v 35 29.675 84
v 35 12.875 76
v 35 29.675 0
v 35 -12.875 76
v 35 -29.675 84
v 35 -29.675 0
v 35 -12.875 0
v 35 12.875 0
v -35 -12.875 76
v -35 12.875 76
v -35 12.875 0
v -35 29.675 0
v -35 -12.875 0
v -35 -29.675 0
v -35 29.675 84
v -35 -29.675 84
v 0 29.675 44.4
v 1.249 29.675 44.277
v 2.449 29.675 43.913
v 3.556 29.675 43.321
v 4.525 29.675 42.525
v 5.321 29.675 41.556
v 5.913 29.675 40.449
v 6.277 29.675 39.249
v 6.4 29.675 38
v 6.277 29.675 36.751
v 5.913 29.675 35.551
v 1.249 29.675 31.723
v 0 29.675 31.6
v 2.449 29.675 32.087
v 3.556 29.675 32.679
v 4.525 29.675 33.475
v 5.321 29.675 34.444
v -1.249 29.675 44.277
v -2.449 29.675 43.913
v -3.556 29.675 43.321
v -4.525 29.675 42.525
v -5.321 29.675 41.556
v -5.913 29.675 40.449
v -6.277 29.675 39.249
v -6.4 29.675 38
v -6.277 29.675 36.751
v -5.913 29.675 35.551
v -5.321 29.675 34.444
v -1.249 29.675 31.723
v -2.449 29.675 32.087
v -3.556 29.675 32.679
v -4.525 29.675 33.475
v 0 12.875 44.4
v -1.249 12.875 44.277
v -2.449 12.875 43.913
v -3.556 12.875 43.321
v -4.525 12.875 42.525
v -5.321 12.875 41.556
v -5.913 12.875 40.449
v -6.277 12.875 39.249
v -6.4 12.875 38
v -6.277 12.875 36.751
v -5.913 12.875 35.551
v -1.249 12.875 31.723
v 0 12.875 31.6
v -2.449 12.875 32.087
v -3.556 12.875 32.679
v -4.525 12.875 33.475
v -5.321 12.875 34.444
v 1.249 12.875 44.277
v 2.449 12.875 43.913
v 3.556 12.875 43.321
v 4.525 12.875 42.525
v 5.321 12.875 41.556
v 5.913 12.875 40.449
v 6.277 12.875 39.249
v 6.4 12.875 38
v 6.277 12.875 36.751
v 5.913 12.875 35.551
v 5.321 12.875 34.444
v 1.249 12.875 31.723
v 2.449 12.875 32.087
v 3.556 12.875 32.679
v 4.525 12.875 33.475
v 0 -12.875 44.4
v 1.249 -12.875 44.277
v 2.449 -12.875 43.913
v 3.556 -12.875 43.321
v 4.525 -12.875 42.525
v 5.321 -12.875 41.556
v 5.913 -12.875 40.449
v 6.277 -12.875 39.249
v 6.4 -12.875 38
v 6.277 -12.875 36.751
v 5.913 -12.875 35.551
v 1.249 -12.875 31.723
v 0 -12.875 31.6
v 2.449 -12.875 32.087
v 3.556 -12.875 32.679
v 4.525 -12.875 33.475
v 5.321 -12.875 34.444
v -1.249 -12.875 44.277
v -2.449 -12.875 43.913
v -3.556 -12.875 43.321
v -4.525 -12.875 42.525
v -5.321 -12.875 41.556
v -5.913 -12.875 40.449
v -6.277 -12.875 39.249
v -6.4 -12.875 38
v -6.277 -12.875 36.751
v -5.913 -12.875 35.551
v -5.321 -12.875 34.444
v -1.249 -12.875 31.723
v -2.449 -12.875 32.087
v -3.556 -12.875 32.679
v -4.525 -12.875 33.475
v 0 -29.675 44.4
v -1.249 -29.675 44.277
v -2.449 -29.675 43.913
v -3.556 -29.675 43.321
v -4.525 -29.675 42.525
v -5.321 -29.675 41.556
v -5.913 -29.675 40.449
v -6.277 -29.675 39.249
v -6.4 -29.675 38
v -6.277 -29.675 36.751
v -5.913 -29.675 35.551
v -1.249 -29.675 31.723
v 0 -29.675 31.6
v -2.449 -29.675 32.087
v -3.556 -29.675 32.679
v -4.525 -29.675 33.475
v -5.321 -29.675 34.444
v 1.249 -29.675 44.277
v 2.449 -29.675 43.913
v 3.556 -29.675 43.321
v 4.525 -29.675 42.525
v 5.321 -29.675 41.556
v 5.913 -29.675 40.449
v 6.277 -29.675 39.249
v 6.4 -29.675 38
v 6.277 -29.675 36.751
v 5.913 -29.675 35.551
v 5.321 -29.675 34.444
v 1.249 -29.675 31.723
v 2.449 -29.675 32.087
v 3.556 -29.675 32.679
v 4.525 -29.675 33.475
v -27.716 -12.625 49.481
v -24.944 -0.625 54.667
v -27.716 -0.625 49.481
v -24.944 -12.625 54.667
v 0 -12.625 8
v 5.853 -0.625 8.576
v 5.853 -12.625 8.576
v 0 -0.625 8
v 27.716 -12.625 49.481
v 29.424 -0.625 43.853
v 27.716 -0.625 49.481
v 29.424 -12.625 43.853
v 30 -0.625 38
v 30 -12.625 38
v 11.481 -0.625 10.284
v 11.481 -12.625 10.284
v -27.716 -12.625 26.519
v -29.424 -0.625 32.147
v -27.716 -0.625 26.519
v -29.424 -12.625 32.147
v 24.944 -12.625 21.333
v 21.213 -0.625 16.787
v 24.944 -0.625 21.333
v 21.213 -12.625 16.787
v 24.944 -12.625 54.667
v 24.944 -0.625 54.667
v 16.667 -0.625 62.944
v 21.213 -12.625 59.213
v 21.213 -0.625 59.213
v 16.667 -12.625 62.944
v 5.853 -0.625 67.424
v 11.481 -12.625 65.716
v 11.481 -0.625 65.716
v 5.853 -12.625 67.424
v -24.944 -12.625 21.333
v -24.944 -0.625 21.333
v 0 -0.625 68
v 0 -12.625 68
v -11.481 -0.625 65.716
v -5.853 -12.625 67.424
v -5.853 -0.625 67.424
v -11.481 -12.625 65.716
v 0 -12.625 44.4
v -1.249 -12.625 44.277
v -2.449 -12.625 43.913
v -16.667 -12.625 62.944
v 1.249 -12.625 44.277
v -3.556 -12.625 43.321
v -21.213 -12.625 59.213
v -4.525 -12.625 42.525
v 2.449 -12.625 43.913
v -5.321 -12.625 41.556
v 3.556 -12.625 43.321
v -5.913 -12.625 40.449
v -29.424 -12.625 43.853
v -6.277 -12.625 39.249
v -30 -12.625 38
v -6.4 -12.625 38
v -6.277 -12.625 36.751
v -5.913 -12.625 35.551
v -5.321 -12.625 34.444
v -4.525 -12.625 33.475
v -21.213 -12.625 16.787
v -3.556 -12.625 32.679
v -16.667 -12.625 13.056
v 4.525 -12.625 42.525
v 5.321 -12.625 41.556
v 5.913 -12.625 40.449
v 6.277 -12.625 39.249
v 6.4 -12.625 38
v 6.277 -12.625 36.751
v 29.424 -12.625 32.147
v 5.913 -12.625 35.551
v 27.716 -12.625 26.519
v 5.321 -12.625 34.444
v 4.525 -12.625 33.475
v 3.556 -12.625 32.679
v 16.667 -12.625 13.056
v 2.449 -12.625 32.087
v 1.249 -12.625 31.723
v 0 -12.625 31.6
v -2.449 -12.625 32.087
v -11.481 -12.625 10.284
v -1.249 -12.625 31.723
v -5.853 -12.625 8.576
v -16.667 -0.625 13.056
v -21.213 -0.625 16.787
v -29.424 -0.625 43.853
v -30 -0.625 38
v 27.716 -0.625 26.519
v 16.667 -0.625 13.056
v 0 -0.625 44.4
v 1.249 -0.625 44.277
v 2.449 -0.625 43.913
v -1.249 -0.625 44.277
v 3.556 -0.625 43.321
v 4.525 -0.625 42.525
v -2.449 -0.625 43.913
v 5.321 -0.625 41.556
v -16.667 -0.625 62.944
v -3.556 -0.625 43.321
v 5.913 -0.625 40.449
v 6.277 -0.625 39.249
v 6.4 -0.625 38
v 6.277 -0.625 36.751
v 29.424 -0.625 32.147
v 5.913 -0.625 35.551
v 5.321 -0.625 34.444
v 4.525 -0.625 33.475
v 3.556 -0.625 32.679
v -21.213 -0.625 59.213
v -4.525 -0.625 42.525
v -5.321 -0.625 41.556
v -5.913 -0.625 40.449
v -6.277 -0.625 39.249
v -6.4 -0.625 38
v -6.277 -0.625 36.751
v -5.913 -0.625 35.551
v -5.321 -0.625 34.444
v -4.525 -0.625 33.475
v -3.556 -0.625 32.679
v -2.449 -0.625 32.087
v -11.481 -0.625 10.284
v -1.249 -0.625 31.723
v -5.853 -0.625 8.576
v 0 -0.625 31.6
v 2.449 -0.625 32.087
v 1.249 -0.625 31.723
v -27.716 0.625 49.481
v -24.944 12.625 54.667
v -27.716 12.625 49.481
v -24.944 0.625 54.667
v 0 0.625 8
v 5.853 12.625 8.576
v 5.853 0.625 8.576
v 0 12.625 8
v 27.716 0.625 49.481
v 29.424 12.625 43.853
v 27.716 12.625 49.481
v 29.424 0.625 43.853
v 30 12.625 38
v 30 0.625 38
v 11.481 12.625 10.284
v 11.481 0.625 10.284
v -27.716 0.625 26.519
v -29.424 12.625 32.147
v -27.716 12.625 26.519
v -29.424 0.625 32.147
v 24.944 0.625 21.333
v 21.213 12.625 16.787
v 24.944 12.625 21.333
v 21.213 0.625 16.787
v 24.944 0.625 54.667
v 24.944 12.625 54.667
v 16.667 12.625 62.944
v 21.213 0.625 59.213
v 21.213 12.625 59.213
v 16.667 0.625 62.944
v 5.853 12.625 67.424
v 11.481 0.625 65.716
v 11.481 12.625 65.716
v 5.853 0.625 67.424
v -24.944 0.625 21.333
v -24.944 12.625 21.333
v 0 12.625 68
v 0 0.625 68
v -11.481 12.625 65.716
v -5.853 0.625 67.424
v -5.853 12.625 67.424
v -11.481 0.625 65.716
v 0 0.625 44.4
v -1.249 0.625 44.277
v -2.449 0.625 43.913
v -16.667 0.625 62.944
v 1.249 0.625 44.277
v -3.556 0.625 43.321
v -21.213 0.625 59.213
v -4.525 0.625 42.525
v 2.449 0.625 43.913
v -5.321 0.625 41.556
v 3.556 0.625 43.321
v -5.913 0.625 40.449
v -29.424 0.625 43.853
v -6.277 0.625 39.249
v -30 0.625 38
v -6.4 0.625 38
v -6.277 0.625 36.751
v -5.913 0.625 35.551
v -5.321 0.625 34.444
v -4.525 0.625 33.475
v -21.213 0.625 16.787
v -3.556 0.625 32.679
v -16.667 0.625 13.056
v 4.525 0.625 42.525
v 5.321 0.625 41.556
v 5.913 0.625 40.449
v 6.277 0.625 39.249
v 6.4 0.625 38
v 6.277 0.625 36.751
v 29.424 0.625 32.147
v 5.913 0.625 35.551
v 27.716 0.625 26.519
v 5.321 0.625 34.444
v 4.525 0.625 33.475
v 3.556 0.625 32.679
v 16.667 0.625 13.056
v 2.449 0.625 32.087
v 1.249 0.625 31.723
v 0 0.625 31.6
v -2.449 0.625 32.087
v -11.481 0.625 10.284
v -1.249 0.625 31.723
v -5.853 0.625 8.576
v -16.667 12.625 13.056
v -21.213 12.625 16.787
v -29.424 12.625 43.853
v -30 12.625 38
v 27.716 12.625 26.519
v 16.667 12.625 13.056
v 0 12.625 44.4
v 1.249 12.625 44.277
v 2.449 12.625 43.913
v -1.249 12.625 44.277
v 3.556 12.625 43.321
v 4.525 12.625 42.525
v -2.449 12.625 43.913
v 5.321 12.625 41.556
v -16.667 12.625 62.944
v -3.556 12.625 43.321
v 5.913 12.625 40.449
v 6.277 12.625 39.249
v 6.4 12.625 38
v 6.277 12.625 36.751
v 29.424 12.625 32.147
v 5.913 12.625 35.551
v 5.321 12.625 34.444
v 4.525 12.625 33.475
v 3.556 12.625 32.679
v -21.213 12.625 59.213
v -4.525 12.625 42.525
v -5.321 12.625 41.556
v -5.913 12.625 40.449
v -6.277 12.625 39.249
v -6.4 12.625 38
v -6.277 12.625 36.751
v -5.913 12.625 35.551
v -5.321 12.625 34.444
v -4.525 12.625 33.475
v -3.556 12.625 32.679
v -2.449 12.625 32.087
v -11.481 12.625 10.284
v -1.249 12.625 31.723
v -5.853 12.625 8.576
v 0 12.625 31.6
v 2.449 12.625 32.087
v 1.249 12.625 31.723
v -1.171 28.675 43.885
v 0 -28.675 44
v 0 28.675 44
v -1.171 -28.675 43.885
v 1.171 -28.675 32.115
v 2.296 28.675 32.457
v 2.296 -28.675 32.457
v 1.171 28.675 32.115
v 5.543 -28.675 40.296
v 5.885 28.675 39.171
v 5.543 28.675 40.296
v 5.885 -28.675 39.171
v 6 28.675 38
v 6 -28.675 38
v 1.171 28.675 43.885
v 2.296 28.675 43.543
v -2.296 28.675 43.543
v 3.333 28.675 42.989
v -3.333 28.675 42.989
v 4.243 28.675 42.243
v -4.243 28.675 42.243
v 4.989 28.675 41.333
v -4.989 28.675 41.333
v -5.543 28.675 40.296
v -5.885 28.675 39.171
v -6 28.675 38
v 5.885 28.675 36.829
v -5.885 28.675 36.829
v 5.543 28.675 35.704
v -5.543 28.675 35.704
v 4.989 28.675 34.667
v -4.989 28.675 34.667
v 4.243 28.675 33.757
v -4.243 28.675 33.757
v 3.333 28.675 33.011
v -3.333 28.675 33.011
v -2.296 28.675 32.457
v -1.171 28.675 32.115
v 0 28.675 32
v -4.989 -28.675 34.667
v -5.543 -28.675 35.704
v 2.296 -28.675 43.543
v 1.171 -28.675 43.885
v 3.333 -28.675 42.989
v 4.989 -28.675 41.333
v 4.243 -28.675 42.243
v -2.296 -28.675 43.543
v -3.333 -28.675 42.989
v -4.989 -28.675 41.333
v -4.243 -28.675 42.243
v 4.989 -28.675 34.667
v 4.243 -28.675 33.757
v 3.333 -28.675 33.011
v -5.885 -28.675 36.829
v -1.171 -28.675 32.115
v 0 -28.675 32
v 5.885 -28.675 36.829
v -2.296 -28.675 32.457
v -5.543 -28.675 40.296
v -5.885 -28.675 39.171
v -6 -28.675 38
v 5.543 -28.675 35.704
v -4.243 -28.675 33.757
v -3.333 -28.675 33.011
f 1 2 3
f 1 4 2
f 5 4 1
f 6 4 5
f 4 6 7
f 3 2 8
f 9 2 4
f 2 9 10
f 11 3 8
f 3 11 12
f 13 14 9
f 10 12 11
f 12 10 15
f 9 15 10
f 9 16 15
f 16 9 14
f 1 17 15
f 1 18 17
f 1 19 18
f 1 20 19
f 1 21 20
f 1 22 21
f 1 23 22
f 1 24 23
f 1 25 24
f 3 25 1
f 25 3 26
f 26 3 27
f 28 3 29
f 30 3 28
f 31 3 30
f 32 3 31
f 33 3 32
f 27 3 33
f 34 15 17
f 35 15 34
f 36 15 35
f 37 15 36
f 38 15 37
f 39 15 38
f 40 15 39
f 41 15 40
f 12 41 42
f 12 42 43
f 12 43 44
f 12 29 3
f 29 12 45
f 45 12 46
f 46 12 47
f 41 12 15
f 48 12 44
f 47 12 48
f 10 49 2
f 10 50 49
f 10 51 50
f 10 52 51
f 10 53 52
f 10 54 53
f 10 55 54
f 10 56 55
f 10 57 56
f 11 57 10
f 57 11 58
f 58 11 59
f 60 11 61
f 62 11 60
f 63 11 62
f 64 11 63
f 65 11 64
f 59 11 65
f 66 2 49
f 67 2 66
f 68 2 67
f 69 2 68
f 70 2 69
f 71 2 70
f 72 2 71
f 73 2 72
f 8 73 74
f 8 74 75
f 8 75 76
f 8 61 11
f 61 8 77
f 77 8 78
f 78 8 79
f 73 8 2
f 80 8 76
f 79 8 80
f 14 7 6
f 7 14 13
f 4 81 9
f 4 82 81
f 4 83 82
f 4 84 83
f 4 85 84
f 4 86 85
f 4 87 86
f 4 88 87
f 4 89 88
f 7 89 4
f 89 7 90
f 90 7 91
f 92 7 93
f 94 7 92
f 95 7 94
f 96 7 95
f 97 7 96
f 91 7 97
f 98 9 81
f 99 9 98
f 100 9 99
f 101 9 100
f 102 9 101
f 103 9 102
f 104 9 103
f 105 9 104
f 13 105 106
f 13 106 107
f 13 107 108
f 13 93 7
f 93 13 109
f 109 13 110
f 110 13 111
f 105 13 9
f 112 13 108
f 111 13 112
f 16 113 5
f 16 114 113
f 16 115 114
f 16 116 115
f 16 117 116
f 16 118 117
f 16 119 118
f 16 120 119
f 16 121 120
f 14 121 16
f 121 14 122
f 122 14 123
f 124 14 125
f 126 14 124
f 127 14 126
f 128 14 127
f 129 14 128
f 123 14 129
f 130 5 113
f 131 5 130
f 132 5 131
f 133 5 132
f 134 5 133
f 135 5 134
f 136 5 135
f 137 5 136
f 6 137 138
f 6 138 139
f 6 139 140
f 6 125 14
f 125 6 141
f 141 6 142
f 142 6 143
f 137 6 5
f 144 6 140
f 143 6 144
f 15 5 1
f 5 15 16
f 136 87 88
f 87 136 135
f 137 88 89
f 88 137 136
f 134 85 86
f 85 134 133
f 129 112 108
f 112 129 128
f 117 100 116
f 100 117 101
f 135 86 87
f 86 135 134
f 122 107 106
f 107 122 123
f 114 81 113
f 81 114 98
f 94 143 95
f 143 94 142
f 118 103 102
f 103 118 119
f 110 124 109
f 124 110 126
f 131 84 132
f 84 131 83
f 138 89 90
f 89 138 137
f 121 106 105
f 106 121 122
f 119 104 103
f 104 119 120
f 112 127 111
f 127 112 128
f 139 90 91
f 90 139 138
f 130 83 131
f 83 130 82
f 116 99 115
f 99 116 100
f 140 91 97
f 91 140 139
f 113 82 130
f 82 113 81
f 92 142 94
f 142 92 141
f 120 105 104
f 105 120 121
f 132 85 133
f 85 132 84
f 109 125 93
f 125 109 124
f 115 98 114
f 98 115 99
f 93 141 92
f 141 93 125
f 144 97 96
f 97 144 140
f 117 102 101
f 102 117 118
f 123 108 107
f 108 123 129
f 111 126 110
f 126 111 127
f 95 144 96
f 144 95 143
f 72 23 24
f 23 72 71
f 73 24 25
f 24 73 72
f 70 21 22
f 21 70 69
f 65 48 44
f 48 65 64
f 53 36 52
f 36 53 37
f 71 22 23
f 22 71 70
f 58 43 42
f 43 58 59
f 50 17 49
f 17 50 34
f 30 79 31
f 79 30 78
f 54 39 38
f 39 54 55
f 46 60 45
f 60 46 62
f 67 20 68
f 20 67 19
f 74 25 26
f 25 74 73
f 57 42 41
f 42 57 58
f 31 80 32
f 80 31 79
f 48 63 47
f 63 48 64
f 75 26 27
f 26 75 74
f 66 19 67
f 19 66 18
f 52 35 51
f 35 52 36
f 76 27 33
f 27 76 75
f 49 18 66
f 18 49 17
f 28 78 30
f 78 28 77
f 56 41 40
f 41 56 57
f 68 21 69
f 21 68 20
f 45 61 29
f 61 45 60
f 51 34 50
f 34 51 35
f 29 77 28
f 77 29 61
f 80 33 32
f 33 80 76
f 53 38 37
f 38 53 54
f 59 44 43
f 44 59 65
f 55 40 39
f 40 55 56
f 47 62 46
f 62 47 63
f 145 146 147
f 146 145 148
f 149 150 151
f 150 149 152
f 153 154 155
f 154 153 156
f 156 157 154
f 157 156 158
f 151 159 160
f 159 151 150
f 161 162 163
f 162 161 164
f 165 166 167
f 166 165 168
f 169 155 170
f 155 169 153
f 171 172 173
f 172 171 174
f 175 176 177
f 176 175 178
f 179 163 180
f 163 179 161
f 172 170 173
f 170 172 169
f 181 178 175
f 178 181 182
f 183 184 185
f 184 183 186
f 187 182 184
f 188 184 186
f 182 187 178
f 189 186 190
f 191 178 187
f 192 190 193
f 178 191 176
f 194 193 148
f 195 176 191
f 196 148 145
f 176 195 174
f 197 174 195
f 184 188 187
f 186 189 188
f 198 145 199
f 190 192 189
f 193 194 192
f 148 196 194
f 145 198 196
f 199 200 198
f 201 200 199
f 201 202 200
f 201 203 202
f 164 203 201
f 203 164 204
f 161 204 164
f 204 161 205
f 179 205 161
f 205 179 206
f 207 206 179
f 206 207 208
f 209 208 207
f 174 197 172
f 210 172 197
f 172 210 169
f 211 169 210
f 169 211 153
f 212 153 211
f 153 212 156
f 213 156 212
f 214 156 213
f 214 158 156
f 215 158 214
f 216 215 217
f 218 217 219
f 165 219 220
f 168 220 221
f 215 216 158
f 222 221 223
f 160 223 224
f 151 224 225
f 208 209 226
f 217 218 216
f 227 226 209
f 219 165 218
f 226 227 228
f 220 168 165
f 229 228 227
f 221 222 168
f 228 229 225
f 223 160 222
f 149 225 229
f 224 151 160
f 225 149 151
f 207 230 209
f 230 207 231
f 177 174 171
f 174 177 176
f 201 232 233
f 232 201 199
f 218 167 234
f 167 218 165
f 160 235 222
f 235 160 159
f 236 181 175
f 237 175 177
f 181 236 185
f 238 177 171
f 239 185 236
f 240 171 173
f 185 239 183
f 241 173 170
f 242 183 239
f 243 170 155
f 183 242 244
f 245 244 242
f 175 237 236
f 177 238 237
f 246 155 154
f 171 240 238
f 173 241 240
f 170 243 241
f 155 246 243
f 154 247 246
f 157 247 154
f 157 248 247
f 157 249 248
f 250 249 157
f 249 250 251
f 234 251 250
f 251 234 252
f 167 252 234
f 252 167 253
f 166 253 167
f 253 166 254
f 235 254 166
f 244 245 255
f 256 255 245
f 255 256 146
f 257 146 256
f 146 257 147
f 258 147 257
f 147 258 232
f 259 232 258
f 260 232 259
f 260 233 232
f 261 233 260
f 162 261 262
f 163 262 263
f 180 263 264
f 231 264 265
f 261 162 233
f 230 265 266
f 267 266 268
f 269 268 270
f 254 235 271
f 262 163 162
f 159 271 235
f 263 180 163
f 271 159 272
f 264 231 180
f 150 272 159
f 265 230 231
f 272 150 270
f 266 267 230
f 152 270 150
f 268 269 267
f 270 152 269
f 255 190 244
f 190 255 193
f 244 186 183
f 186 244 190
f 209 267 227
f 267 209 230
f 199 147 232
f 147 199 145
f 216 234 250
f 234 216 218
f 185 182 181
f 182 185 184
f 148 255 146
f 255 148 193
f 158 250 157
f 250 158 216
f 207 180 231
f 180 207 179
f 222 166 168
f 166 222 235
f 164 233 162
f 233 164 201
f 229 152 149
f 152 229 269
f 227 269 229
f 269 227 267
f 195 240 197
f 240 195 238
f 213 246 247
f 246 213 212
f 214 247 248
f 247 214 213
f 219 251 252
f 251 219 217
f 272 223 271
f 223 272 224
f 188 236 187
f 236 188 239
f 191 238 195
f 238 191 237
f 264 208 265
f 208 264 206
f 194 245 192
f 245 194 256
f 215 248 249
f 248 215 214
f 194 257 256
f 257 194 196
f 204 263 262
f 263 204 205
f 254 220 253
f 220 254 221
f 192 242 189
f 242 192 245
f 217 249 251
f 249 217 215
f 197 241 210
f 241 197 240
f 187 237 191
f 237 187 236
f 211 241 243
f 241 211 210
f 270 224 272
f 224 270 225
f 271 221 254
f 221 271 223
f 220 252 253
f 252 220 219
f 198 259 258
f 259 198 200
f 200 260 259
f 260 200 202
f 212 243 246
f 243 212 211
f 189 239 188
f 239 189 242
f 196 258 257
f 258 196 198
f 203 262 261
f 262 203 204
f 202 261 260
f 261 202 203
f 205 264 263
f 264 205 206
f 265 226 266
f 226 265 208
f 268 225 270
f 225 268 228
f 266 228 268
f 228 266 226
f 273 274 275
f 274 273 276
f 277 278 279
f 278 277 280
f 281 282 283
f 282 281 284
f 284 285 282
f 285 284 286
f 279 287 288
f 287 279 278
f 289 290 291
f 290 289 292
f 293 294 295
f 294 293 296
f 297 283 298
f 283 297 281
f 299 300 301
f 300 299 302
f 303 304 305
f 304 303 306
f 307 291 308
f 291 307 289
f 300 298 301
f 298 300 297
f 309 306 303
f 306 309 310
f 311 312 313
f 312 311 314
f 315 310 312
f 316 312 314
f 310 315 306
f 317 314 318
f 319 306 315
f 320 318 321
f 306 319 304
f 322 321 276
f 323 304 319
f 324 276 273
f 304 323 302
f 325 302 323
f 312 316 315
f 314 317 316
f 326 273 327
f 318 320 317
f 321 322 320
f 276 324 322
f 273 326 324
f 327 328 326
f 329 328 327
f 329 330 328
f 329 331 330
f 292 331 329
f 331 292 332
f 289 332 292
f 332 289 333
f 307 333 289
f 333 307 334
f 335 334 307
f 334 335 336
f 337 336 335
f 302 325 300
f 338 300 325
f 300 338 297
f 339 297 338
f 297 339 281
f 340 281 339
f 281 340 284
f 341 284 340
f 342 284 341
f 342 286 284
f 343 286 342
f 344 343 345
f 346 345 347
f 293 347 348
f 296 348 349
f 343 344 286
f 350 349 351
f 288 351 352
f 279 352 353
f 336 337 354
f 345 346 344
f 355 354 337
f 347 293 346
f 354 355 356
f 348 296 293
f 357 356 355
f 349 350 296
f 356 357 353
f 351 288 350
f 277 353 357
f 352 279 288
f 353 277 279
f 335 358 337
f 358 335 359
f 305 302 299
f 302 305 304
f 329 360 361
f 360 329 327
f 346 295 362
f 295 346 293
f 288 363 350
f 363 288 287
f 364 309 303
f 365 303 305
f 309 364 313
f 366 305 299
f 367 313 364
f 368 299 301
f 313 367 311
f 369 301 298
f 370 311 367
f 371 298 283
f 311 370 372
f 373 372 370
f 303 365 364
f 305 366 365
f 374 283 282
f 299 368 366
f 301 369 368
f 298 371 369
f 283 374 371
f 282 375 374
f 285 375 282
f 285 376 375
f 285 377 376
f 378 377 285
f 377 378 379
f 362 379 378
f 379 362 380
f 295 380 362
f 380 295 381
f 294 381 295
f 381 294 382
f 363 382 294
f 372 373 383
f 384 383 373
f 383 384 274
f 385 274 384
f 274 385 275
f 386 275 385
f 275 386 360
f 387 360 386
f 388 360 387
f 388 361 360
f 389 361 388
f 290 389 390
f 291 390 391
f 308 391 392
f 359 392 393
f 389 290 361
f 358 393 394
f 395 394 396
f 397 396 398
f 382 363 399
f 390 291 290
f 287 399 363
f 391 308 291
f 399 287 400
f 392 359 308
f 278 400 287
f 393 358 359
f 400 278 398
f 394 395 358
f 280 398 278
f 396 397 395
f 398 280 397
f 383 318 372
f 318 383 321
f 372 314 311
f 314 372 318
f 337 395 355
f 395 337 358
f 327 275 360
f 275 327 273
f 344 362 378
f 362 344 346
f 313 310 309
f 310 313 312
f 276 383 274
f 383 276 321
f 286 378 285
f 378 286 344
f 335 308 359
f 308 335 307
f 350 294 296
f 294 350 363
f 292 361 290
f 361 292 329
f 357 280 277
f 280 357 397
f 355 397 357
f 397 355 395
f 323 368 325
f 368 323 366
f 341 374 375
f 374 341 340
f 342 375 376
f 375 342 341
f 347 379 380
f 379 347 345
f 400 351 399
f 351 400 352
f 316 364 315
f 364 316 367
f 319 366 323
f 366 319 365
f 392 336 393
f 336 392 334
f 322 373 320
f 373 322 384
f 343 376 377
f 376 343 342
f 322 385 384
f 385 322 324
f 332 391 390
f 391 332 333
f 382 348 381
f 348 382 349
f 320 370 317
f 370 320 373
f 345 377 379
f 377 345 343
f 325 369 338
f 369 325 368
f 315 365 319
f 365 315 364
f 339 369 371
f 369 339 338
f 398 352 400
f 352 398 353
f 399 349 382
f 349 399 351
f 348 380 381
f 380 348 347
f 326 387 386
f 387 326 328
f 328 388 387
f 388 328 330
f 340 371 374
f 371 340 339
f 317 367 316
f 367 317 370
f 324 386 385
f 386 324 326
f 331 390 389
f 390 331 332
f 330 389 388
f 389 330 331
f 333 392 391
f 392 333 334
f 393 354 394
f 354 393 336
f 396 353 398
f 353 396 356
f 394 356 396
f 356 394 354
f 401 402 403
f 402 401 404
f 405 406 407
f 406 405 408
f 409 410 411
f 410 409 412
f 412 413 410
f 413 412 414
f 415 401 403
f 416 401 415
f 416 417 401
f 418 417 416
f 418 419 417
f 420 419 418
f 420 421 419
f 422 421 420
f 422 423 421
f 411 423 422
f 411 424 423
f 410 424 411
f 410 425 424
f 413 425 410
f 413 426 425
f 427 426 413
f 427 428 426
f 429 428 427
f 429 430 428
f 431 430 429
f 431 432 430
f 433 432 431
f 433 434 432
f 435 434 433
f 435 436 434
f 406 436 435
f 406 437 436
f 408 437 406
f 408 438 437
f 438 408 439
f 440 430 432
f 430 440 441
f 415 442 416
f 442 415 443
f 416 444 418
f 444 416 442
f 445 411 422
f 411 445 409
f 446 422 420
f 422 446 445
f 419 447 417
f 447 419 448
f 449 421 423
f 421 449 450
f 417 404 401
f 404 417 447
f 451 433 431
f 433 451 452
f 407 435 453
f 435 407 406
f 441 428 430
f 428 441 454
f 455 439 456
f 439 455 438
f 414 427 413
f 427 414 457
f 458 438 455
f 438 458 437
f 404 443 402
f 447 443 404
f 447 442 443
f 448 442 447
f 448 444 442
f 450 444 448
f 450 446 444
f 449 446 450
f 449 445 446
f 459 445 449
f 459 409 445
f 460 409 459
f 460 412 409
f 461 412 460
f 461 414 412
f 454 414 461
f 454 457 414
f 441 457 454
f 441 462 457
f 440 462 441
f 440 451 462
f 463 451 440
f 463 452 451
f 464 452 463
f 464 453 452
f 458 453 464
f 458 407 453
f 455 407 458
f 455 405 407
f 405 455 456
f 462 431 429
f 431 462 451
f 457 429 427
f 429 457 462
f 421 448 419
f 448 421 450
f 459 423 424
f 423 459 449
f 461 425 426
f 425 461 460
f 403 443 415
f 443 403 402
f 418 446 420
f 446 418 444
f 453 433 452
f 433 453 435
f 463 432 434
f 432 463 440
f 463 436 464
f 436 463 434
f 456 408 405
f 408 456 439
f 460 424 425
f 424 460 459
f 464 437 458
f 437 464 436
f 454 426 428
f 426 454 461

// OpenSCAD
$fn = 32;

// ------------------------------------------------------------------------
// Trolley wheel set: wheels d60, fork 76 mm tall
// Every part is its own module, assembly() places every instance.
// ------------------------------------------------------------------------

// --- part 1 ---
module trolley_fork() {
  difference() {
    union() {
      translate([-35, 12.875, 0]) cube([70, 16.8, 76]);
      translate([-35, -29.675, 0]) cube([70, 16.8, 76]);
      translate([-35, -29.675, 76]) cube([70, 59.35, 8]);
    }
    translate([0, -21.275, 38]) rotate([90, 0, 0]) cylinder(h = 18.8, d = 12.8, center = true);
    translate([0, 21.275, 38]) rotate([90, 0, 0]) cylinder(h = 18.8, d = 12.8, center = true);
  }
}

// --- part 2 ---
module trolley_wheel() {
  difference() {
      translate([0, 0, 0]) cylinder(h = 12, d = 60);
      translate([0, 0, -1]) cylinder(h = 14, d = 12.8);
    }
}

// --- part 3 ---
module trolley_axle() {
  translate([0, 0, -28.675]) cylinder(h = 57.35, d = 12);
}

// --- assembly ---
module assembly() {
  color([0.80, 0.24, 0.20]) translate([0, 0, 0]) rotate([0, 0, 0]) trolley_fork();
  color([0.20, 0.45, 0.75]) translate([0, -0.625, 38]) rotate([90, 0, 0]) trolley_wheel();
  color([0.25, 0.62, 0.32]) translate([0, 12.625, 38]) rotate([90, 0, 0]) trolley_wheel();
  color([0.92, 0.70, 0.18]) translate([0, 0, 38]) rotate([90, 0, 0]) trolley_axle();
}

assembly();
